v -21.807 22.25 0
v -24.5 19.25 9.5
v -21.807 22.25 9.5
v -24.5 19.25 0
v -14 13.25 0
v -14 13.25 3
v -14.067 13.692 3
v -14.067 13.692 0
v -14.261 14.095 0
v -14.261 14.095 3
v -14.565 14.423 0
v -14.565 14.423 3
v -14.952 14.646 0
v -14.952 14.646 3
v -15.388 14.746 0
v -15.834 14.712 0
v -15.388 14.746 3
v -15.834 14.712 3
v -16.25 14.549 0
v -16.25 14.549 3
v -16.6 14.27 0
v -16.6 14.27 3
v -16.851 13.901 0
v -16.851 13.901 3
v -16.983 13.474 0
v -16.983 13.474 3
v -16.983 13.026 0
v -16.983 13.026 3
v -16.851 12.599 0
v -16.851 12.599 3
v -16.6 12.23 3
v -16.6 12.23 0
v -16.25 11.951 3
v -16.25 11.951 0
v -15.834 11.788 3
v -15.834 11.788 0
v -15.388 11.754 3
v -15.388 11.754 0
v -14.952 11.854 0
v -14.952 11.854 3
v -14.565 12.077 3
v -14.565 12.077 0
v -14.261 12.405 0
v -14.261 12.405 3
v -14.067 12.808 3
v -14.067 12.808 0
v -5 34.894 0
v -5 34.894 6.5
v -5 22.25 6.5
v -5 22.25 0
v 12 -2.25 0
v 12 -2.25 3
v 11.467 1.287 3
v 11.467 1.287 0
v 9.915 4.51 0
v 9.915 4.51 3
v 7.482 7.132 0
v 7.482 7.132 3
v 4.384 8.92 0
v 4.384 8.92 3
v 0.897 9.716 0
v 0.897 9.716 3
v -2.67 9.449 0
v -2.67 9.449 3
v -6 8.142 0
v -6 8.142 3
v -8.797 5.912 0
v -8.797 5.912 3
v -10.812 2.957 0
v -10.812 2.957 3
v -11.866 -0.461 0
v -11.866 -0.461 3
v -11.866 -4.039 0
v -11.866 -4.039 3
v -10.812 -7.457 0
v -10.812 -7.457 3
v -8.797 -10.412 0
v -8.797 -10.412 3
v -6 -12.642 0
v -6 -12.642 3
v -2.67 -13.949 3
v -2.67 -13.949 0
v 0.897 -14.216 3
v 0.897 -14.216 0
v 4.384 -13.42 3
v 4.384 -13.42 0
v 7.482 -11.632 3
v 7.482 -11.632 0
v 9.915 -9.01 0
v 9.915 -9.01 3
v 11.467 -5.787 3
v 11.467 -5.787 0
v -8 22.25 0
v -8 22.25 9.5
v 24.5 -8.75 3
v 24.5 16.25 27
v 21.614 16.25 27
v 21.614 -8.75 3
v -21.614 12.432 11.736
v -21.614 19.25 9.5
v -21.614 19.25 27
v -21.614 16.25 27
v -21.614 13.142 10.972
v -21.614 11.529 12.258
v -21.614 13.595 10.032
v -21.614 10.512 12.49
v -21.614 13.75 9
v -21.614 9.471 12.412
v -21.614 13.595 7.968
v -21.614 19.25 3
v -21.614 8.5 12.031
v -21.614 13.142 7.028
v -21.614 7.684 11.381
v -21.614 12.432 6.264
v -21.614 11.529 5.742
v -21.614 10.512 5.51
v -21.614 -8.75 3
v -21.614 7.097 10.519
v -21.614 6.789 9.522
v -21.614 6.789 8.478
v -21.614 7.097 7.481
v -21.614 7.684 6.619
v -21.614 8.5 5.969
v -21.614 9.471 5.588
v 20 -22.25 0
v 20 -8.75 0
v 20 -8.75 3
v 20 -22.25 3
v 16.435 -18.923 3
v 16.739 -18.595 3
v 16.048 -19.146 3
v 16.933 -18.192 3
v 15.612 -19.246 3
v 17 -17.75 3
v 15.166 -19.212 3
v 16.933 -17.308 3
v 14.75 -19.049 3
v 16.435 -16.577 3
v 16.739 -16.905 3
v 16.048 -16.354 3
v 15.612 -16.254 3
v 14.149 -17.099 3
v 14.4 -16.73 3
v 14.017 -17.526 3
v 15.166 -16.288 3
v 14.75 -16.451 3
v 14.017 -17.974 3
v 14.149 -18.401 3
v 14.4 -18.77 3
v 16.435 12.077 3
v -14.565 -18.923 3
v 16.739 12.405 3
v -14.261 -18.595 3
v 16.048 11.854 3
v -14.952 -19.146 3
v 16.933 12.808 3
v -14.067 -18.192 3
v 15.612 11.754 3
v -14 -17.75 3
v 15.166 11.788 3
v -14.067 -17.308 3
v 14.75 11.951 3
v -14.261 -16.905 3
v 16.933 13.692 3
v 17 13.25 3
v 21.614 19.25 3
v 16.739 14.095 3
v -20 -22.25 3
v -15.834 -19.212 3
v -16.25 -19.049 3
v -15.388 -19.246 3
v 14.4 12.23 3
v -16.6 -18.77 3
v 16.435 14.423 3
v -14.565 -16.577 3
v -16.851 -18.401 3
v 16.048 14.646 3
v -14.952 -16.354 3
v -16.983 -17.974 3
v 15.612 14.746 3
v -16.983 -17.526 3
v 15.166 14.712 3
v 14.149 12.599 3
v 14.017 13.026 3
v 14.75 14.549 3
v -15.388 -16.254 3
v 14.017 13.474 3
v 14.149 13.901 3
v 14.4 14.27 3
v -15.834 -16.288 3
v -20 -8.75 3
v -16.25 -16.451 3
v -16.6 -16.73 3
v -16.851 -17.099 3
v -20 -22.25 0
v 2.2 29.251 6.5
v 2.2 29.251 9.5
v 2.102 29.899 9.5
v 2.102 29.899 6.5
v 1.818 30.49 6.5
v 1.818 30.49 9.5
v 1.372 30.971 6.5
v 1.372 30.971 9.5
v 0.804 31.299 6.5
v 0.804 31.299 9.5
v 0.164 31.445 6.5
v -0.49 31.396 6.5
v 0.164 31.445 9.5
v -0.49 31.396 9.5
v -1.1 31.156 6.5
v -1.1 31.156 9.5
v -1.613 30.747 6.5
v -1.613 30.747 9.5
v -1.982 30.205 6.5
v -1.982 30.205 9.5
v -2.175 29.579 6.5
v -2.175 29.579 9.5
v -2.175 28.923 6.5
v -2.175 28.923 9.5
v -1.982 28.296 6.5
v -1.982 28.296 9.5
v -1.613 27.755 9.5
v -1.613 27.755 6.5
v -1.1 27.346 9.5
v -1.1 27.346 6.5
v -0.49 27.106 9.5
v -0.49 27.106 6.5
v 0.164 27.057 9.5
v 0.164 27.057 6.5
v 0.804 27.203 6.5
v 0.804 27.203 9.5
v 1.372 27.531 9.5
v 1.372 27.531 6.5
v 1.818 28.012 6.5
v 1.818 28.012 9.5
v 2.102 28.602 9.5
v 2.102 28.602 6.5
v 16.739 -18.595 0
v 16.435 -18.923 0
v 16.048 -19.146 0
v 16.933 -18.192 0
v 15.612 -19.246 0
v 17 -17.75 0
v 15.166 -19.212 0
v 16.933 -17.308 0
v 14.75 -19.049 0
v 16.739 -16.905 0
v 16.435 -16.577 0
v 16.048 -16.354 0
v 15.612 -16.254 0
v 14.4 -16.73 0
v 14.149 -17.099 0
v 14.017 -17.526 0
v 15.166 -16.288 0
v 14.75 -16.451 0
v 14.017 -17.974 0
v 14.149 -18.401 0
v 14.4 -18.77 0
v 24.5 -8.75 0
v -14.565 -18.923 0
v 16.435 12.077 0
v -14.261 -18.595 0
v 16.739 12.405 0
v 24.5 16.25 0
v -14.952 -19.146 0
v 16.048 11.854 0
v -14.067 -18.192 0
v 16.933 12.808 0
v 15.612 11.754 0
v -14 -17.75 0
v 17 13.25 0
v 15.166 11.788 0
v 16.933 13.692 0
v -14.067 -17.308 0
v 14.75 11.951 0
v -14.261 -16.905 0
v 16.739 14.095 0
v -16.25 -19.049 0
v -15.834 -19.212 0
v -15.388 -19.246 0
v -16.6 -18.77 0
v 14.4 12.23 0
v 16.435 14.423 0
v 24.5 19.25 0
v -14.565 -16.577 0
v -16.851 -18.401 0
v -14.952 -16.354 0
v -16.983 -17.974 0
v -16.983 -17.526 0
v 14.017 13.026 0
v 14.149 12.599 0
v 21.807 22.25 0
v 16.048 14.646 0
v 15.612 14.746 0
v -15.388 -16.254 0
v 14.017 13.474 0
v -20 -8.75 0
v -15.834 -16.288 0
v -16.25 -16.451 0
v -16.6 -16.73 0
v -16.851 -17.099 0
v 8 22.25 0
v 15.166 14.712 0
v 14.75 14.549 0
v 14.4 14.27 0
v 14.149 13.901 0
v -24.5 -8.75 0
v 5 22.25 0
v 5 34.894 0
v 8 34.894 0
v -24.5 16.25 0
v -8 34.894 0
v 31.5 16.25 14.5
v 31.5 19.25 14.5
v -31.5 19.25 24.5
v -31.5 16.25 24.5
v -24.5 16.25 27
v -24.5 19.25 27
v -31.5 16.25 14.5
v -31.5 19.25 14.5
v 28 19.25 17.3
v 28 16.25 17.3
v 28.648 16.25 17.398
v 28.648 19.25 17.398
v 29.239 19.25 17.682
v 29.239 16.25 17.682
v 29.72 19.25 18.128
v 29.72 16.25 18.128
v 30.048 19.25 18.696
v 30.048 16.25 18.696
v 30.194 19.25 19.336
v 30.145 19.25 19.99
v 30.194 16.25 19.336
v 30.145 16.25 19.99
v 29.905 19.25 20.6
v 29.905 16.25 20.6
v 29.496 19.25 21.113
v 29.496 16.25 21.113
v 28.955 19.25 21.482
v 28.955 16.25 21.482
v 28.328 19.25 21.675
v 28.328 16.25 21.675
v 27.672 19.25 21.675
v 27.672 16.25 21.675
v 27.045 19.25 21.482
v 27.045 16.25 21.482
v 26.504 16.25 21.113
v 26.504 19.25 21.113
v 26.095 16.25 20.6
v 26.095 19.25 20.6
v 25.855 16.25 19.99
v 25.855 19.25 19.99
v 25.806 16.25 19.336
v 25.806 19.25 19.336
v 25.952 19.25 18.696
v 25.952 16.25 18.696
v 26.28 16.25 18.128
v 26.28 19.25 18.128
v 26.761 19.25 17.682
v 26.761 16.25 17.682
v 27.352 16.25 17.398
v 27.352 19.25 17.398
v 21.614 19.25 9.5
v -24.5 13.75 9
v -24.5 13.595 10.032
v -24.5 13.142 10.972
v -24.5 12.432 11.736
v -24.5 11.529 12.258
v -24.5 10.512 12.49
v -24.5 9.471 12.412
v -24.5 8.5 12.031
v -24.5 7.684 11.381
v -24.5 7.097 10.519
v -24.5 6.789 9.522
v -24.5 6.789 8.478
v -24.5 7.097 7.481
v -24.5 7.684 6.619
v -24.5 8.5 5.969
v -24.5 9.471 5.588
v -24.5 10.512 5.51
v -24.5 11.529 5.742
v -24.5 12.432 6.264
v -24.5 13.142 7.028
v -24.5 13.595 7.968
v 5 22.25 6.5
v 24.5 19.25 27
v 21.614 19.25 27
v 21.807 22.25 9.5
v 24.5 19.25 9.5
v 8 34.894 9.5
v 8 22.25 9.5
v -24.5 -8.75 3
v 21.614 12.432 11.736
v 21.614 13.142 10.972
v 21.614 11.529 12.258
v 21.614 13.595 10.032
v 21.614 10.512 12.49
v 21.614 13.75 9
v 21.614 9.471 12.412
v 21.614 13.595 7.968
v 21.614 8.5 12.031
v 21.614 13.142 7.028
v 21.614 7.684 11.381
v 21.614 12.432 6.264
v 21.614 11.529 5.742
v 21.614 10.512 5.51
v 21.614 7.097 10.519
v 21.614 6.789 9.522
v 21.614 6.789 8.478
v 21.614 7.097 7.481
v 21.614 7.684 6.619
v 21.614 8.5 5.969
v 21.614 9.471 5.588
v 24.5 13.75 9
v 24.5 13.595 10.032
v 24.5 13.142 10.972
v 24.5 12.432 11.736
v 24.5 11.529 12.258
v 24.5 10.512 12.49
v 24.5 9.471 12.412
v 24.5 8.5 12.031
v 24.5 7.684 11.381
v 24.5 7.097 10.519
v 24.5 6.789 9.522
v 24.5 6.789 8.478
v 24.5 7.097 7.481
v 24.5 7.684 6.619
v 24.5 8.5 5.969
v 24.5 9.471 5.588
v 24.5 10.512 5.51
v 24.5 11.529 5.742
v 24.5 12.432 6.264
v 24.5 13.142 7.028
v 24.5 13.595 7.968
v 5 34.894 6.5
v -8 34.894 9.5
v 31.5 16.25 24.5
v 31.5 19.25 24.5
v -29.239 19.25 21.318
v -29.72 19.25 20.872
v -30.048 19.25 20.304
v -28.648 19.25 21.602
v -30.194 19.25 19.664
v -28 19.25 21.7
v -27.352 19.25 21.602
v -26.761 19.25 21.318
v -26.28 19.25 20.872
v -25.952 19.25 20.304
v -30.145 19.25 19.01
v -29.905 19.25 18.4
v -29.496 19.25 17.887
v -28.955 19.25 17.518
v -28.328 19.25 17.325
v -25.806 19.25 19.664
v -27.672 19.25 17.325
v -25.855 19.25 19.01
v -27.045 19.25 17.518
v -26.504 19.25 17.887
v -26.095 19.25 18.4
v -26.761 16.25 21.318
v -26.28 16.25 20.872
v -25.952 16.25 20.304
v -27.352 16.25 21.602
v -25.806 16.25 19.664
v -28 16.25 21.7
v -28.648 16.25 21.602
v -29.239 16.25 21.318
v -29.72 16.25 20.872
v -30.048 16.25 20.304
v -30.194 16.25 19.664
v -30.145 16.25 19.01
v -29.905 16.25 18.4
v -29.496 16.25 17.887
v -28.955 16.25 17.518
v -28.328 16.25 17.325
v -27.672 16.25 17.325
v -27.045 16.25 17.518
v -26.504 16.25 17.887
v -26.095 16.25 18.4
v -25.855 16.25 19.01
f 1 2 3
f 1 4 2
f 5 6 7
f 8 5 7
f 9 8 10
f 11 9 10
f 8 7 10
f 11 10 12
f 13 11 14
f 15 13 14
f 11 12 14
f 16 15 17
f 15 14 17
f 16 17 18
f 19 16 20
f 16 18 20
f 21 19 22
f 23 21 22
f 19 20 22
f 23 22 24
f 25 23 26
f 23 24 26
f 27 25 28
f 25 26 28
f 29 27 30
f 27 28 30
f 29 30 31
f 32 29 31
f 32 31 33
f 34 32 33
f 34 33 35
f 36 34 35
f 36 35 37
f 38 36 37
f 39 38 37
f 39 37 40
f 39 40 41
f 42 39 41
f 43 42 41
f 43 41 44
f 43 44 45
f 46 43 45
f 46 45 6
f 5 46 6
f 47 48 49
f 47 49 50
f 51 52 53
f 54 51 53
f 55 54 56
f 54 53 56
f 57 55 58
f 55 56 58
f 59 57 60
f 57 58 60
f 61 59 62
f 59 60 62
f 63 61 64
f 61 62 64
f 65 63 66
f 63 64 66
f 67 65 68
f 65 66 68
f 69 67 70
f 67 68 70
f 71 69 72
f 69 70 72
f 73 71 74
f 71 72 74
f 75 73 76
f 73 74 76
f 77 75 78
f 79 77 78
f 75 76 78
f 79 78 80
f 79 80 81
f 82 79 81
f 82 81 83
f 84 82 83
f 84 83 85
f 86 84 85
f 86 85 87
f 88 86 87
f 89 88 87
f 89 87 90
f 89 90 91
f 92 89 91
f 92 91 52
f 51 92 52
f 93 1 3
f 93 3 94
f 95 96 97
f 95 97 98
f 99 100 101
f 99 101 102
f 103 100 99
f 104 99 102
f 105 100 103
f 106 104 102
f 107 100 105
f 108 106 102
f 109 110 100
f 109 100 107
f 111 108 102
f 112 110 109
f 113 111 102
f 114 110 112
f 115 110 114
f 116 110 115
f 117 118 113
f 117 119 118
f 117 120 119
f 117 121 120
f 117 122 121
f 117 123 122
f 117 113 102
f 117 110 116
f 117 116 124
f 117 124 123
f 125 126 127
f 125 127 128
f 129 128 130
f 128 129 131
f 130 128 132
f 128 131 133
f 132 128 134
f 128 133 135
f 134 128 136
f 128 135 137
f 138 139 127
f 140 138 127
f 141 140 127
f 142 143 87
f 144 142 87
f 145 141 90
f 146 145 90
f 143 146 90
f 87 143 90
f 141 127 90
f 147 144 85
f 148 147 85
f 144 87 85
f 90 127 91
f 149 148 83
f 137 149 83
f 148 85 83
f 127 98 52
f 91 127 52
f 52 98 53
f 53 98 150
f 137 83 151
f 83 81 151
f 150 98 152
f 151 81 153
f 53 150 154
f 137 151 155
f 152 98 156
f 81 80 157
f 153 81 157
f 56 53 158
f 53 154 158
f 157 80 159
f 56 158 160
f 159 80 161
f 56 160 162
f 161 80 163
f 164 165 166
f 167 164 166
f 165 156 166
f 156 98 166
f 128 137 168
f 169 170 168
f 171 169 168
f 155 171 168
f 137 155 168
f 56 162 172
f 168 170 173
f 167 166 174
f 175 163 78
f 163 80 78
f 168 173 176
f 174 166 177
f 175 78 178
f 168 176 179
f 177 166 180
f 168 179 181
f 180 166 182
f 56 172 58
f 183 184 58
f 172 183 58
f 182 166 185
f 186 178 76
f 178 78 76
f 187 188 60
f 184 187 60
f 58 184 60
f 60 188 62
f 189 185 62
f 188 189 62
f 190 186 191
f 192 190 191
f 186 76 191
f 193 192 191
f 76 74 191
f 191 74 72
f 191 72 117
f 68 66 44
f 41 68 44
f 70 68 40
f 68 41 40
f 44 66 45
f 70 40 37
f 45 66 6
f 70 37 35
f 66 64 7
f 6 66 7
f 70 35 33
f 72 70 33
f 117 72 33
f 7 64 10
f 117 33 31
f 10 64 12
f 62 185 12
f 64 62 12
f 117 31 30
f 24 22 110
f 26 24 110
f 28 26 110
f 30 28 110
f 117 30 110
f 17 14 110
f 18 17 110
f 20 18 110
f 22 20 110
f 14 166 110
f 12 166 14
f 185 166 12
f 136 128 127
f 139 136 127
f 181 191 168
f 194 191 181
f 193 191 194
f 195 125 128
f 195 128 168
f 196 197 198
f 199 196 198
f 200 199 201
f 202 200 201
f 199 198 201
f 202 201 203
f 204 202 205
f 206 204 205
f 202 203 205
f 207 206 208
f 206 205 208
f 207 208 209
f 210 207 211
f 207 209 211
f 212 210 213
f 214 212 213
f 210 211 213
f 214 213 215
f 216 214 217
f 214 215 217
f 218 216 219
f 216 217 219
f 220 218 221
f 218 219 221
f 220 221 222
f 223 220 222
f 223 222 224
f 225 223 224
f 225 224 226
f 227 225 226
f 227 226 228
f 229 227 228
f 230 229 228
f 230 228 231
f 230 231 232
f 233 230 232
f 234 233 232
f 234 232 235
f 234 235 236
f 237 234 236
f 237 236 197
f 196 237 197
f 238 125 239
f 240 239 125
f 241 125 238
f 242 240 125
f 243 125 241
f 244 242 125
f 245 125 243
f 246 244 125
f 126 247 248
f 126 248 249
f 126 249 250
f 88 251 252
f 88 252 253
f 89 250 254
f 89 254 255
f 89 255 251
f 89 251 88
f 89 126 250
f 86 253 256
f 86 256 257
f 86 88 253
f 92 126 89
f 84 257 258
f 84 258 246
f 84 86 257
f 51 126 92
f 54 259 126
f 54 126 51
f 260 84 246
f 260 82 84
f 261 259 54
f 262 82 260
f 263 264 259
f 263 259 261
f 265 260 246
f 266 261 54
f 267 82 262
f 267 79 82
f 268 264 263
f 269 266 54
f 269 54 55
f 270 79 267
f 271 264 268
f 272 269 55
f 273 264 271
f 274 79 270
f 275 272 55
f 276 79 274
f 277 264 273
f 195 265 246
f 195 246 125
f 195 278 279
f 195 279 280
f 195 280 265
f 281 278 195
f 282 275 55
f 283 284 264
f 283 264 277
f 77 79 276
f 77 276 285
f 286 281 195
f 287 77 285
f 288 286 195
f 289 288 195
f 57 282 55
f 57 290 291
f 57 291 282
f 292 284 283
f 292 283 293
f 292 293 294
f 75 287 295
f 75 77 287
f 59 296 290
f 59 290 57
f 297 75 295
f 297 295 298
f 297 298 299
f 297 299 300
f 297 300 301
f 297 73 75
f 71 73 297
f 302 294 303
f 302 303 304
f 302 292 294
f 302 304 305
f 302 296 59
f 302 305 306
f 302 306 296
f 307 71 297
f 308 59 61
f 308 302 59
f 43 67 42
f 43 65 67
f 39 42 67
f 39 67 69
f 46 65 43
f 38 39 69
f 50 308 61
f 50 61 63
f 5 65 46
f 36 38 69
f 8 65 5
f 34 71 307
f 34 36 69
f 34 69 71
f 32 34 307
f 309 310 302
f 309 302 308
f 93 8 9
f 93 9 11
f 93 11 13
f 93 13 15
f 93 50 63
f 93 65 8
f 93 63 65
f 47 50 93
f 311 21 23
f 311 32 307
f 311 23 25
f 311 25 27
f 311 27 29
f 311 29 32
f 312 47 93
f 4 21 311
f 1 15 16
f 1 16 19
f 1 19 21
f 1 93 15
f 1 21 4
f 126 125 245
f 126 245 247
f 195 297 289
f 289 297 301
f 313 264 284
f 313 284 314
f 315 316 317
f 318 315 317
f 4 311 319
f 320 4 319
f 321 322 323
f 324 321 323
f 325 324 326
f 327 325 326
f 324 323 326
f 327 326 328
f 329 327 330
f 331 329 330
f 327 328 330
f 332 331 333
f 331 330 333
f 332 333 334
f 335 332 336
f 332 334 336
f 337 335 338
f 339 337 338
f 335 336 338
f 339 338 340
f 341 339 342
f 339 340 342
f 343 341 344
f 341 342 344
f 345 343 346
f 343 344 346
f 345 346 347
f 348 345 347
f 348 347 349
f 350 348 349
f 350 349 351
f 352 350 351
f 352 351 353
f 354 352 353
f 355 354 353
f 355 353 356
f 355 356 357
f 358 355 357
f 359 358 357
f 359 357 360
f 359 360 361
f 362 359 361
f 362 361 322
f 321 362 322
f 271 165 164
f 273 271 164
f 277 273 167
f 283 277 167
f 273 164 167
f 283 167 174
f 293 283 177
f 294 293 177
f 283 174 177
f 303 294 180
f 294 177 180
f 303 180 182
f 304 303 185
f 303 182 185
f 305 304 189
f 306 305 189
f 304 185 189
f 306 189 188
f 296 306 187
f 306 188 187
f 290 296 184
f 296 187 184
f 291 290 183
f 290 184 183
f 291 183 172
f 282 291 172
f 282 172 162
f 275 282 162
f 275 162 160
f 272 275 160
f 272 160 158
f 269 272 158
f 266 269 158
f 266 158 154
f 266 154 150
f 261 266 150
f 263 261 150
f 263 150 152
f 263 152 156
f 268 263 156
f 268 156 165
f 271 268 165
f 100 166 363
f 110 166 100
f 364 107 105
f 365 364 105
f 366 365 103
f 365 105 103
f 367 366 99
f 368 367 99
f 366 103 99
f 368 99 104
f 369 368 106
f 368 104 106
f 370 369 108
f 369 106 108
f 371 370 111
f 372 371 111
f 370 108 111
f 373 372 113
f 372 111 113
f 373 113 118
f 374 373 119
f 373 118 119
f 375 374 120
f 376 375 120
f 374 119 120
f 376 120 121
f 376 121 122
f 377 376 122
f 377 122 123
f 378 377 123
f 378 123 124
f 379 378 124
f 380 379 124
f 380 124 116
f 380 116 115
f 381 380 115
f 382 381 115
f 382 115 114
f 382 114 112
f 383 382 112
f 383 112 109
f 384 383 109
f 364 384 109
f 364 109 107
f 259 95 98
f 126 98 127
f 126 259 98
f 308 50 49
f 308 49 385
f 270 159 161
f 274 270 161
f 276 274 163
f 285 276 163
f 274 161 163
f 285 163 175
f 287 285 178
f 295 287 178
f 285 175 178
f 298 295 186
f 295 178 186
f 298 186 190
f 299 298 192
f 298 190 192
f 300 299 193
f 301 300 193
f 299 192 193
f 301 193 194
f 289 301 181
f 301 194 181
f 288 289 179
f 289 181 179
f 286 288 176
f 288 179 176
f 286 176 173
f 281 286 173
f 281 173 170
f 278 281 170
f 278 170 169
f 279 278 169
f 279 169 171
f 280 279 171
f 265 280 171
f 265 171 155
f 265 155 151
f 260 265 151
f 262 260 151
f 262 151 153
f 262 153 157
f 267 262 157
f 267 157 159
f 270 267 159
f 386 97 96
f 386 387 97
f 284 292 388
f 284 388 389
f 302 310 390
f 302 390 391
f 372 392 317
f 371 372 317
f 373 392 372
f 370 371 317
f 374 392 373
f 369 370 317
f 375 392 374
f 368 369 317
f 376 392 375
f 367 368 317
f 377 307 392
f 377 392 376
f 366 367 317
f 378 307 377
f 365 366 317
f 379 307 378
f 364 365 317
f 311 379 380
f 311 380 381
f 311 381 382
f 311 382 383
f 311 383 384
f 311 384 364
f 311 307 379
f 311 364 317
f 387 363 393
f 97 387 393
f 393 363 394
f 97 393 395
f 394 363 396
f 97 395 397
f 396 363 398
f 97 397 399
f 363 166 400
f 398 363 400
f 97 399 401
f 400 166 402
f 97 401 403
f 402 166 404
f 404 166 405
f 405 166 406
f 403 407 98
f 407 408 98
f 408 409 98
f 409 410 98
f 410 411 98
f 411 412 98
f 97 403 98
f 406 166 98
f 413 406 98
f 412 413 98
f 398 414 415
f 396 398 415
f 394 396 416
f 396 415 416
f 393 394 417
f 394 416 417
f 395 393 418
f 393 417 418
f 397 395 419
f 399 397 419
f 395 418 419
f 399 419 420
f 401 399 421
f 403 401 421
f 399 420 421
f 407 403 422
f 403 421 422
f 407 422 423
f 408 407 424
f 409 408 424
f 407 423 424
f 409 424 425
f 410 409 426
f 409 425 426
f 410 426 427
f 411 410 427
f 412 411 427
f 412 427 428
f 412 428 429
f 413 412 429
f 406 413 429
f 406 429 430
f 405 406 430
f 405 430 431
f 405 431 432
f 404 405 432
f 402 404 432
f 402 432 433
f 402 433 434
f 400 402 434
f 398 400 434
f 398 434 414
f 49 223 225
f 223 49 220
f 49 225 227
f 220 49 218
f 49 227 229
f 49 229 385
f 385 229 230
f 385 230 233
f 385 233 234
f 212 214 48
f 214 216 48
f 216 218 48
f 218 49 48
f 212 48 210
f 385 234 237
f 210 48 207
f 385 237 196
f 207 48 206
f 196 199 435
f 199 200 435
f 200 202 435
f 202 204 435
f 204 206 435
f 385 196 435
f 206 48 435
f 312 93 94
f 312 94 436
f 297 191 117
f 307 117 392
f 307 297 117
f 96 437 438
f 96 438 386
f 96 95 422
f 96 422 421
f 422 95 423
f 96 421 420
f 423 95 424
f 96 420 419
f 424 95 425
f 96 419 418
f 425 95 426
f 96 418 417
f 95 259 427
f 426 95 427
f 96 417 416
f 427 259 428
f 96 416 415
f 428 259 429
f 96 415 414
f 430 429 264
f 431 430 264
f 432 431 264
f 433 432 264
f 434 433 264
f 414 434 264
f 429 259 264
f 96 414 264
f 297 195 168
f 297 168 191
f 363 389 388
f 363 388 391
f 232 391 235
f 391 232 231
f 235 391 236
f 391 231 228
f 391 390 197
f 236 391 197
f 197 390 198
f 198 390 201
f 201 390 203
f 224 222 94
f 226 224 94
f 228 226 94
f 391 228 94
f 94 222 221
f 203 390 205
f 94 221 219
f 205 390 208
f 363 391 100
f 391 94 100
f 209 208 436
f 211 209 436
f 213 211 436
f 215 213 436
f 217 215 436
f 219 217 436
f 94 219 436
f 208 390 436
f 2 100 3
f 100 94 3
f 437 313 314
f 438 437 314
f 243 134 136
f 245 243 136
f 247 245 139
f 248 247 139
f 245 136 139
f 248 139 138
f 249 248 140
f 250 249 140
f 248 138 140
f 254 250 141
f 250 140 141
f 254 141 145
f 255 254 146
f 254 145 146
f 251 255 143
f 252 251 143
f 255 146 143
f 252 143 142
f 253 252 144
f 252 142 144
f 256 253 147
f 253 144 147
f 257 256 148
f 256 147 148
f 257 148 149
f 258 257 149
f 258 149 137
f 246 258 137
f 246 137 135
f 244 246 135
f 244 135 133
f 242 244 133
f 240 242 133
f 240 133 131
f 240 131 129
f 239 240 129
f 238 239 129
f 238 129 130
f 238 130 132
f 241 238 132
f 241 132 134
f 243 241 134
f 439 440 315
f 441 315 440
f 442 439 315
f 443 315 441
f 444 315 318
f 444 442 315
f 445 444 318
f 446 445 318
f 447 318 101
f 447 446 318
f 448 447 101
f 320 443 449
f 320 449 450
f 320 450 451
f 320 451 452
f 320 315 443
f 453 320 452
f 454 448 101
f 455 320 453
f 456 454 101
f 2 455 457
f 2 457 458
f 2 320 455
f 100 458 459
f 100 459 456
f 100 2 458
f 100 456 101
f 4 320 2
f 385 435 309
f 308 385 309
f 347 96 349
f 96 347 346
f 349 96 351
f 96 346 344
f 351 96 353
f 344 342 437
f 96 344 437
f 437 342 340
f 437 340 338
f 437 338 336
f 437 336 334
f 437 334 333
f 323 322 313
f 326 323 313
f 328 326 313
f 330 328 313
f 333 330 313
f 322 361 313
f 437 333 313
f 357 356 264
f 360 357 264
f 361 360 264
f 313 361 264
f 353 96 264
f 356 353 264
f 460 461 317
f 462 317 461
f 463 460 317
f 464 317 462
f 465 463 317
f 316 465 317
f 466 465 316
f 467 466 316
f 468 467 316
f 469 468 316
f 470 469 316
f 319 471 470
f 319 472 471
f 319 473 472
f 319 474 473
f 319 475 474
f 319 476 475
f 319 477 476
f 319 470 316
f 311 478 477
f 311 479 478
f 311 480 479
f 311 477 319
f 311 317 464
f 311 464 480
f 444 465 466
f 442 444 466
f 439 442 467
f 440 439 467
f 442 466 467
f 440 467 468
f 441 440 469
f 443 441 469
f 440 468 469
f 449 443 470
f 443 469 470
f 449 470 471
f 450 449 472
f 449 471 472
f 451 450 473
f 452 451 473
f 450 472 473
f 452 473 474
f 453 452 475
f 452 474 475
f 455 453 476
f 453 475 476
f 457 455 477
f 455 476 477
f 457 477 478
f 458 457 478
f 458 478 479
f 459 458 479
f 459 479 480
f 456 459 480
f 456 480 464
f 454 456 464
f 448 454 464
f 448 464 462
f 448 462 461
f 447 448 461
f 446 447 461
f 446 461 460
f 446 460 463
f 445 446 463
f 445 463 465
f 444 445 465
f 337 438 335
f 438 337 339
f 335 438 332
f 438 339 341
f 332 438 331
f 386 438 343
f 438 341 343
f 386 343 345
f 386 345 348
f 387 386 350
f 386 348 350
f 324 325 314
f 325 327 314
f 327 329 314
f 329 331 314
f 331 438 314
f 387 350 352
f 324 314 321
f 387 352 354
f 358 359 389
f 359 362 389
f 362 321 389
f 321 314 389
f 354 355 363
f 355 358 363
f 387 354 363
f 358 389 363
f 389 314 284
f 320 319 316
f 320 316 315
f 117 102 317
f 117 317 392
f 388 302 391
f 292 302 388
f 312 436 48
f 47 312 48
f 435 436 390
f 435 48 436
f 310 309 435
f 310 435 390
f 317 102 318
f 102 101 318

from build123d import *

# Parameters (mm, degrees)
BOSS_EXTRUDE1_DEPTH   = 3
BOSS_EXTRUDE2_DEPTH   = 27
BOSS_EXTRUDE2_2_DEPTH = 27
BOSS_EXTRUDE3_DEPTH   = 3
BOSS_EXTRUDE4_DEPTH   = 6.5
SKETCH5_R             = 3.5
CUT_EXTRUDE1_DEPTH    = 72.292294366
SKETCH6_R             = 2.2
CUT_EXTRUDE2_DEPTH    = 57.599469962
SKETCH7_W             = 10
SKETCH7_H             = 6.5
CUT_EXTRUDE3_DEPTH    = 12.644
SKETCH8_R             = 12
SKETCH8_R_2           = 1.5
CUT_EXTRUDE4_DEPTH    = 53.781068917
SKETCH9_R             = 2.2
CUT_EXTRUDE5_DEPTH    = 51.160654262


with BuildPart() as part:
    # Sketch1 → Boss-Extrude1 (new body)
    with BuildSketch(Plane.XY):
        Polygon((-8, 22.25), (-8, 34.894), (8, 34.894), (8, 22.25), (20, 22.25), (20, -22.25), (-20, -22.25), (-20, 22.25), align=None)
    extrude(amount=BOSS_EXTRUDE1_DEPTH)



with BuildPart() as body_2:
    # Sketch2 → Boss-Extrude2 (new body)
    with BuildSketch(Plane(origin=(0, 0, 0), x_dir=(-1, 0, 0), z_dir=(0, 0, -1))):
        Polygon((31.5, 19.25), (21.614, 19.25), (21.614, -8.75), (24.5, -8.75), (24.5, 16.25), (31.5, 16.25), align=None)
    extrude(amount=-BOSS_EXTRUDE2_DEPTH)


with BuildPart() as body_3:
    # Sketch2 → Boss-Extrude2 2 (new body)
    with BuildSketch(Plane(origin=(0, 0, 0), x_dir=(-1, 0, 0), z_dir=(0, 0, -1))):
        Polygon((-31.5, 16.25), (-31.5, 19.25), (-21.614, 19.25), (-21.614, -8.75), (-24.5, -8.75), (-24.5, 16.25), align=None)
    extrude(amount=-BOSS_EXTRUDE2_2_DEPTH)


with BuildPart() as part_1:
    add(part.part)

    add(body_2.part)  # Boss-Extrude3 merges body 2

    add(body_3.part)  # Boss-Extrude3 merges body 3
    # Sketch3 → Boss-Extrude3 (add)
    with BuildSketch(Plane(origin=(0, 0, 0), x_dir=(-1, 0, 0), z_dir=(0, 0, -1))):
        Polygon((-21.614, -8.75), (21.614, -8.75), (21.614, 19.25), (24.5, 19.25), (21.807, 22.25), (-21.807, 22.25), (-24.5, 19.25), (-21.614, 19.25), align=None)
    extrude(amount=-BOSS_EXTRUDE3_DEPTH)

    # Sketch4 → Boss-Extrude4 (add)
    with BuildSketch(Plane.XY.offset(3)):
        Polygon((-24.5, 19.25), (-21.807, 22.25), (-8, 22.25), (-8, 34.894), (8, 34.894), (8, 22.25), (21.807, 22.25), (24.5, 19.25), align=None)
    extrude(amount=BOSS_EXTRUDE4_DEPTH)

    # Sketch5 → Cut-Extrude1 (cut, through all)
    with BuildSketch(Plane(origin=(24.5, 0, 0), x_dir=(0, 0, -1), z_dir=(1, 0, 0))):
        with Locations(Location((-9, 10.25, 0), (0, 0, 90))):
            Circle(SKETCH5_R)
        Polygon((-27, 16.25), (-3, -8.75), (-27, -8.75), align=None)
    extrude(amount=-CUT_EXTRUDE1_DEPTH, mode=Mode.SUBTRACT)

    # Sketch6 → Cut-Extrude2 (cut, through all)
    with BuildSketch(Plane.XZ.offset(-16.25)):
        with Locations(Location((28, 19.5, 0), (0, 0, 270))):
            Circle(SKETCH6_R)
        with Locations(Location((-28, 19.5, 0), (0, 0, 90))):
            Circle(SKETCH6_R)
        Polygon((24.5, 27), (31.5, 27), (31.5, 24.5), align=None)
        Polygon((24.5, 0), (31.5, 14.5), (31.5, 0), align=None)
        Polygon((-31.5, 0), (-24.5, 0), (-31.5, 14.5), align=None)
        Polygon((-31.5, 24.5), (-24.5, 27), (-31.5, 27), align=None)
    extrude(amount=-CUT_EXTRUDE2_DEPTH, mode=Mode.SUBTRACT)

    # Sketch7 → Cut-Extrude3 (cut)
    with BuildSketch(Plane(origin=(0, 34.894, 0), x_dir=(1, 0, 0), z_dir=(0, 1, 0))):
        with Locations((0, -3.25)):
            Rectangle(SKETCH7_W, SKETCH7_H)
    extrude(amount=-CUT_EXTRUDE3_DEPTH, mode=Mode.SUBTRACT)

    # Sketch8 → Cut-Extrude4 (cut, through all)
    with BuildSketch(Plane.XY.offset(3)):
        with Locations((0, -2.25)):
            Circle(SKETCH8_R)
        with Locations((-15.5, 13.25)):
            Circle(SKETCH8_R_2)
        with Locations((15.5, 13.25)):
            Circle(SKETCH8_R_2)
        with Locations((15.5, -17.75)):
            Circle(SKETCH8_R_2)
        with Locations((-15.5, -17.75)):
            Circle(SKETCH8_R_2)
    extrude(amount=-CUT_EXTRUDE4_DEPTH, mode=Mode.SUBTRACT)

    # Sketch9 → Cut-Extrude5 (cut, through all)
    with BuildSketch(Plane.XY.offset(9.5)):
        with Locations((0, 29.2509)):
            Circle(SKETCH9_R)
    extrude(amount=-CUT_EXTRUDE5_DEPTH, mode=Mode.SUBTRACT)


solid = part_1.part
